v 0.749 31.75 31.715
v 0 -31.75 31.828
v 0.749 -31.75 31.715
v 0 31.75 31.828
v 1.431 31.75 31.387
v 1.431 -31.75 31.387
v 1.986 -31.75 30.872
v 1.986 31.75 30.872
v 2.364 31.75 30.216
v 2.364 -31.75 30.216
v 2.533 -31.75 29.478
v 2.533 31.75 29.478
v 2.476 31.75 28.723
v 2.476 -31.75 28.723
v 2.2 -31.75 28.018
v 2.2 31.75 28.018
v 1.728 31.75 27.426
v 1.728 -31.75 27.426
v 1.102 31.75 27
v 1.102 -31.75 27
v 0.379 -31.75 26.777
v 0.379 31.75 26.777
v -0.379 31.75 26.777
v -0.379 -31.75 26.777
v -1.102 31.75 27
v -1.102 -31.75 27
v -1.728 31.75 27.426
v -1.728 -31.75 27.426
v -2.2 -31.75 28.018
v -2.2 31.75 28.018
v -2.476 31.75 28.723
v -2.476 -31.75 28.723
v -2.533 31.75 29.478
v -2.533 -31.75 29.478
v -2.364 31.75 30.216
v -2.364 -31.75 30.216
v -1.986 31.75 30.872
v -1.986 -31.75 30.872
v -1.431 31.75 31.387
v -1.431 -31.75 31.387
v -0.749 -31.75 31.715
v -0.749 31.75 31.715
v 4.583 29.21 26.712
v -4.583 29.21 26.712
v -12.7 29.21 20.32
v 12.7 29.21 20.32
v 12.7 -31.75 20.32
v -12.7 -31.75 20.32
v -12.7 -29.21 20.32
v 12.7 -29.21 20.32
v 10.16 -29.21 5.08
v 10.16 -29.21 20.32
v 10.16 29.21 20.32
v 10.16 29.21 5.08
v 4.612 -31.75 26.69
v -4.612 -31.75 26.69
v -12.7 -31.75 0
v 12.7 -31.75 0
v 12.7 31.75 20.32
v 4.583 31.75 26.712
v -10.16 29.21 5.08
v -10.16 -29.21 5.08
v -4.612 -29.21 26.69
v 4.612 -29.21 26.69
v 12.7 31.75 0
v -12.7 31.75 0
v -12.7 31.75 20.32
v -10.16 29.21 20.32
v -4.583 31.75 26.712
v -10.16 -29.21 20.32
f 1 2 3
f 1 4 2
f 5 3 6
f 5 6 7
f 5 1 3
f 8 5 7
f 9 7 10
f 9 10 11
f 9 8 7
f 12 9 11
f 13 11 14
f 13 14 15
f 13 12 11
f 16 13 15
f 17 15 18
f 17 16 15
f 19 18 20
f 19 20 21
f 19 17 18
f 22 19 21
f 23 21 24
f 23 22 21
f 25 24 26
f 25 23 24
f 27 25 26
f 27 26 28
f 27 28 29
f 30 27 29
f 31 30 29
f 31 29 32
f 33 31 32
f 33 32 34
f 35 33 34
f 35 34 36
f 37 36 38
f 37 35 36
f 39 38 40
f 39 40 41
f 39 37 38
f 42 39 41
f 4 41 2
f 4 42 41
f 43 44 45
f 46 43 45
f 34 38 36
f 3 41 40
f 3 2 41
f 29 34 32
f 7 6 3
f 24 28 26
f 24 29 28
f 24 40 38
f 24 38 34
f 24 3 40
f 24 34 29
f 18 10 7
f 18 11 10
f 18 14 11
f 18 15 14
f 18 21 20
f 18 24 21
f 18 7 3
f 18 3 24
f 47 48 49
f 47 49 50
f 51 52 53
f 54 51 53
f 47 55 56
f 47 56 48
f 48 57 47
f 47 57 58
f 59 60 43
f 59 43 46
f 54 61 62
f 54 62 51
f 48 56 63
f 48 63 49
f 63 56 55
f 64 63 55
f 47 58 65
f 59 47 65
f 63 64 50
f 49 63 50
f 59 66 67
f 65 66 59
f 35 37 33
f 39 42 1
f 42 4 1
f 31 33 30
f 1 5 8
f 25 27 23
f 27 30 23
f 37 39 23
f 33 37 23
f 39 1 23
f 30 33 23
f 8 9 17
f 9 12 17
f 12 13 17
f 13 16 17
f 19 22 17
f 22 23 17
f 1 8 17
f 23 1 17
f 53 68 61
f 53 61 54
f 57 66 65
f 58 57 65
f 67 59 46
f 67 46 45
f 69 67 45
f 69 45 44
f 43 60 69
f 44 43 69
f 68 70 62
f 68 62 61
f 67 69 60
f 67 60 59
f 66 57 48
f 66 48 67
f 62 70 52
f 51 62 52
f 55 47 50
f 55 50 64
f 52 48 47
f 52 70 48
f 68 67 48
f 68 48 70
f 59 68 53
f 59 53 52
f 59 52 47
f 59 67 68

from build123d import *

# Parameters (mm, degrees)
F0_W      = 25.4
F0_H      = 63.5
F1_DEPTH  = 20.32
F2_W      = 20.32
F2_H      = 58.42
F3_DEPTH  = 15.24
F4_W      = 63.5
F4_H      = 2.54
F7_DEPTH  = 2.54
F9_DEPTH  = 2.54
F11_DEPTH = 2.54
F13_DEPTH = 2.54


with BuildPart() as f1:
    # F0 (on Top) → F1 (new body)
    with BuildSketch(Plane.XY):
        Rectangle(F0_W, F0_H)
    extrude(amount=F1_DEPTH)

    # F2 (on face) → F3 (cut)
    with BuildSketch(Plane.XY.offset(20.32)):
        Rectangle(F2_W, F2_H)
    extrude(amount=-F3_DEPTH, mode=Mode.SUBTRACT)


with BuildPart() as f5:
    # F4 (on Right) → F5 (revolve)
    with BuildSketch(Plane.YZ):
        with Locations((0, 30.5581537774)):
            Rectangle(F4_W, F4_H)
    revolve(axis=Axis((0, 0, 29.2881537774), (0, 1, 0)))


with BuildPart() as f7:
    # F6 (on face) → F7 (new body)
    with BuildSketch(Plane.XZ.offset(31.75)):
        Polygon((0, 30.3222630173), (-12.7, 20.32), (12.7, 20.32), align=None)
    extrude(amount=-F7_DEPTH)

    # F10 (on face) → F11 (cut)
    with BuildSketch(Plane.XZ.offset(31.75)):
        Polygon((-4.6117142786, 26.6901701689), (0, 26.6901701689), (4.6117142786, 26.6901701689), (0, 30.3222630173), align=None)
    extrude(amount=-F11_DEPTH, mode=Mode.SUBTRACT)


with BuildPart() as f9:
    # F8 (on face) → F9 (new body)
    with BuildSketch(Plane(origin=(0, 31.75, 0), x_dir=(-1, 0, 0), z_dir=(0, 1, 0))):
        Polygon((0, 30.3222630173), (-12.7, 20.32), (12.7, 20.32), align=None)
    extrude(amount=-F9_DEPTH)

    # F12 (on face) → F13 (cut)
    with BuildSketch(Plane(origin=(0, 31.75, 0), x_dir=(-1, 0, 0), z_dir=(0, 1, 0))):
        Polygon((-4.5833718294, 26.7124921083), (0, 26.7124921083), (4.5833718294, 26.7124921083), (0, 30.3222630173), align=None)
    extrude(amount=-F13_DEPTH, mode=Mode.SUBTRACT)


solid = Compound([f1.part, f5.part, f7.part, f9.part])
